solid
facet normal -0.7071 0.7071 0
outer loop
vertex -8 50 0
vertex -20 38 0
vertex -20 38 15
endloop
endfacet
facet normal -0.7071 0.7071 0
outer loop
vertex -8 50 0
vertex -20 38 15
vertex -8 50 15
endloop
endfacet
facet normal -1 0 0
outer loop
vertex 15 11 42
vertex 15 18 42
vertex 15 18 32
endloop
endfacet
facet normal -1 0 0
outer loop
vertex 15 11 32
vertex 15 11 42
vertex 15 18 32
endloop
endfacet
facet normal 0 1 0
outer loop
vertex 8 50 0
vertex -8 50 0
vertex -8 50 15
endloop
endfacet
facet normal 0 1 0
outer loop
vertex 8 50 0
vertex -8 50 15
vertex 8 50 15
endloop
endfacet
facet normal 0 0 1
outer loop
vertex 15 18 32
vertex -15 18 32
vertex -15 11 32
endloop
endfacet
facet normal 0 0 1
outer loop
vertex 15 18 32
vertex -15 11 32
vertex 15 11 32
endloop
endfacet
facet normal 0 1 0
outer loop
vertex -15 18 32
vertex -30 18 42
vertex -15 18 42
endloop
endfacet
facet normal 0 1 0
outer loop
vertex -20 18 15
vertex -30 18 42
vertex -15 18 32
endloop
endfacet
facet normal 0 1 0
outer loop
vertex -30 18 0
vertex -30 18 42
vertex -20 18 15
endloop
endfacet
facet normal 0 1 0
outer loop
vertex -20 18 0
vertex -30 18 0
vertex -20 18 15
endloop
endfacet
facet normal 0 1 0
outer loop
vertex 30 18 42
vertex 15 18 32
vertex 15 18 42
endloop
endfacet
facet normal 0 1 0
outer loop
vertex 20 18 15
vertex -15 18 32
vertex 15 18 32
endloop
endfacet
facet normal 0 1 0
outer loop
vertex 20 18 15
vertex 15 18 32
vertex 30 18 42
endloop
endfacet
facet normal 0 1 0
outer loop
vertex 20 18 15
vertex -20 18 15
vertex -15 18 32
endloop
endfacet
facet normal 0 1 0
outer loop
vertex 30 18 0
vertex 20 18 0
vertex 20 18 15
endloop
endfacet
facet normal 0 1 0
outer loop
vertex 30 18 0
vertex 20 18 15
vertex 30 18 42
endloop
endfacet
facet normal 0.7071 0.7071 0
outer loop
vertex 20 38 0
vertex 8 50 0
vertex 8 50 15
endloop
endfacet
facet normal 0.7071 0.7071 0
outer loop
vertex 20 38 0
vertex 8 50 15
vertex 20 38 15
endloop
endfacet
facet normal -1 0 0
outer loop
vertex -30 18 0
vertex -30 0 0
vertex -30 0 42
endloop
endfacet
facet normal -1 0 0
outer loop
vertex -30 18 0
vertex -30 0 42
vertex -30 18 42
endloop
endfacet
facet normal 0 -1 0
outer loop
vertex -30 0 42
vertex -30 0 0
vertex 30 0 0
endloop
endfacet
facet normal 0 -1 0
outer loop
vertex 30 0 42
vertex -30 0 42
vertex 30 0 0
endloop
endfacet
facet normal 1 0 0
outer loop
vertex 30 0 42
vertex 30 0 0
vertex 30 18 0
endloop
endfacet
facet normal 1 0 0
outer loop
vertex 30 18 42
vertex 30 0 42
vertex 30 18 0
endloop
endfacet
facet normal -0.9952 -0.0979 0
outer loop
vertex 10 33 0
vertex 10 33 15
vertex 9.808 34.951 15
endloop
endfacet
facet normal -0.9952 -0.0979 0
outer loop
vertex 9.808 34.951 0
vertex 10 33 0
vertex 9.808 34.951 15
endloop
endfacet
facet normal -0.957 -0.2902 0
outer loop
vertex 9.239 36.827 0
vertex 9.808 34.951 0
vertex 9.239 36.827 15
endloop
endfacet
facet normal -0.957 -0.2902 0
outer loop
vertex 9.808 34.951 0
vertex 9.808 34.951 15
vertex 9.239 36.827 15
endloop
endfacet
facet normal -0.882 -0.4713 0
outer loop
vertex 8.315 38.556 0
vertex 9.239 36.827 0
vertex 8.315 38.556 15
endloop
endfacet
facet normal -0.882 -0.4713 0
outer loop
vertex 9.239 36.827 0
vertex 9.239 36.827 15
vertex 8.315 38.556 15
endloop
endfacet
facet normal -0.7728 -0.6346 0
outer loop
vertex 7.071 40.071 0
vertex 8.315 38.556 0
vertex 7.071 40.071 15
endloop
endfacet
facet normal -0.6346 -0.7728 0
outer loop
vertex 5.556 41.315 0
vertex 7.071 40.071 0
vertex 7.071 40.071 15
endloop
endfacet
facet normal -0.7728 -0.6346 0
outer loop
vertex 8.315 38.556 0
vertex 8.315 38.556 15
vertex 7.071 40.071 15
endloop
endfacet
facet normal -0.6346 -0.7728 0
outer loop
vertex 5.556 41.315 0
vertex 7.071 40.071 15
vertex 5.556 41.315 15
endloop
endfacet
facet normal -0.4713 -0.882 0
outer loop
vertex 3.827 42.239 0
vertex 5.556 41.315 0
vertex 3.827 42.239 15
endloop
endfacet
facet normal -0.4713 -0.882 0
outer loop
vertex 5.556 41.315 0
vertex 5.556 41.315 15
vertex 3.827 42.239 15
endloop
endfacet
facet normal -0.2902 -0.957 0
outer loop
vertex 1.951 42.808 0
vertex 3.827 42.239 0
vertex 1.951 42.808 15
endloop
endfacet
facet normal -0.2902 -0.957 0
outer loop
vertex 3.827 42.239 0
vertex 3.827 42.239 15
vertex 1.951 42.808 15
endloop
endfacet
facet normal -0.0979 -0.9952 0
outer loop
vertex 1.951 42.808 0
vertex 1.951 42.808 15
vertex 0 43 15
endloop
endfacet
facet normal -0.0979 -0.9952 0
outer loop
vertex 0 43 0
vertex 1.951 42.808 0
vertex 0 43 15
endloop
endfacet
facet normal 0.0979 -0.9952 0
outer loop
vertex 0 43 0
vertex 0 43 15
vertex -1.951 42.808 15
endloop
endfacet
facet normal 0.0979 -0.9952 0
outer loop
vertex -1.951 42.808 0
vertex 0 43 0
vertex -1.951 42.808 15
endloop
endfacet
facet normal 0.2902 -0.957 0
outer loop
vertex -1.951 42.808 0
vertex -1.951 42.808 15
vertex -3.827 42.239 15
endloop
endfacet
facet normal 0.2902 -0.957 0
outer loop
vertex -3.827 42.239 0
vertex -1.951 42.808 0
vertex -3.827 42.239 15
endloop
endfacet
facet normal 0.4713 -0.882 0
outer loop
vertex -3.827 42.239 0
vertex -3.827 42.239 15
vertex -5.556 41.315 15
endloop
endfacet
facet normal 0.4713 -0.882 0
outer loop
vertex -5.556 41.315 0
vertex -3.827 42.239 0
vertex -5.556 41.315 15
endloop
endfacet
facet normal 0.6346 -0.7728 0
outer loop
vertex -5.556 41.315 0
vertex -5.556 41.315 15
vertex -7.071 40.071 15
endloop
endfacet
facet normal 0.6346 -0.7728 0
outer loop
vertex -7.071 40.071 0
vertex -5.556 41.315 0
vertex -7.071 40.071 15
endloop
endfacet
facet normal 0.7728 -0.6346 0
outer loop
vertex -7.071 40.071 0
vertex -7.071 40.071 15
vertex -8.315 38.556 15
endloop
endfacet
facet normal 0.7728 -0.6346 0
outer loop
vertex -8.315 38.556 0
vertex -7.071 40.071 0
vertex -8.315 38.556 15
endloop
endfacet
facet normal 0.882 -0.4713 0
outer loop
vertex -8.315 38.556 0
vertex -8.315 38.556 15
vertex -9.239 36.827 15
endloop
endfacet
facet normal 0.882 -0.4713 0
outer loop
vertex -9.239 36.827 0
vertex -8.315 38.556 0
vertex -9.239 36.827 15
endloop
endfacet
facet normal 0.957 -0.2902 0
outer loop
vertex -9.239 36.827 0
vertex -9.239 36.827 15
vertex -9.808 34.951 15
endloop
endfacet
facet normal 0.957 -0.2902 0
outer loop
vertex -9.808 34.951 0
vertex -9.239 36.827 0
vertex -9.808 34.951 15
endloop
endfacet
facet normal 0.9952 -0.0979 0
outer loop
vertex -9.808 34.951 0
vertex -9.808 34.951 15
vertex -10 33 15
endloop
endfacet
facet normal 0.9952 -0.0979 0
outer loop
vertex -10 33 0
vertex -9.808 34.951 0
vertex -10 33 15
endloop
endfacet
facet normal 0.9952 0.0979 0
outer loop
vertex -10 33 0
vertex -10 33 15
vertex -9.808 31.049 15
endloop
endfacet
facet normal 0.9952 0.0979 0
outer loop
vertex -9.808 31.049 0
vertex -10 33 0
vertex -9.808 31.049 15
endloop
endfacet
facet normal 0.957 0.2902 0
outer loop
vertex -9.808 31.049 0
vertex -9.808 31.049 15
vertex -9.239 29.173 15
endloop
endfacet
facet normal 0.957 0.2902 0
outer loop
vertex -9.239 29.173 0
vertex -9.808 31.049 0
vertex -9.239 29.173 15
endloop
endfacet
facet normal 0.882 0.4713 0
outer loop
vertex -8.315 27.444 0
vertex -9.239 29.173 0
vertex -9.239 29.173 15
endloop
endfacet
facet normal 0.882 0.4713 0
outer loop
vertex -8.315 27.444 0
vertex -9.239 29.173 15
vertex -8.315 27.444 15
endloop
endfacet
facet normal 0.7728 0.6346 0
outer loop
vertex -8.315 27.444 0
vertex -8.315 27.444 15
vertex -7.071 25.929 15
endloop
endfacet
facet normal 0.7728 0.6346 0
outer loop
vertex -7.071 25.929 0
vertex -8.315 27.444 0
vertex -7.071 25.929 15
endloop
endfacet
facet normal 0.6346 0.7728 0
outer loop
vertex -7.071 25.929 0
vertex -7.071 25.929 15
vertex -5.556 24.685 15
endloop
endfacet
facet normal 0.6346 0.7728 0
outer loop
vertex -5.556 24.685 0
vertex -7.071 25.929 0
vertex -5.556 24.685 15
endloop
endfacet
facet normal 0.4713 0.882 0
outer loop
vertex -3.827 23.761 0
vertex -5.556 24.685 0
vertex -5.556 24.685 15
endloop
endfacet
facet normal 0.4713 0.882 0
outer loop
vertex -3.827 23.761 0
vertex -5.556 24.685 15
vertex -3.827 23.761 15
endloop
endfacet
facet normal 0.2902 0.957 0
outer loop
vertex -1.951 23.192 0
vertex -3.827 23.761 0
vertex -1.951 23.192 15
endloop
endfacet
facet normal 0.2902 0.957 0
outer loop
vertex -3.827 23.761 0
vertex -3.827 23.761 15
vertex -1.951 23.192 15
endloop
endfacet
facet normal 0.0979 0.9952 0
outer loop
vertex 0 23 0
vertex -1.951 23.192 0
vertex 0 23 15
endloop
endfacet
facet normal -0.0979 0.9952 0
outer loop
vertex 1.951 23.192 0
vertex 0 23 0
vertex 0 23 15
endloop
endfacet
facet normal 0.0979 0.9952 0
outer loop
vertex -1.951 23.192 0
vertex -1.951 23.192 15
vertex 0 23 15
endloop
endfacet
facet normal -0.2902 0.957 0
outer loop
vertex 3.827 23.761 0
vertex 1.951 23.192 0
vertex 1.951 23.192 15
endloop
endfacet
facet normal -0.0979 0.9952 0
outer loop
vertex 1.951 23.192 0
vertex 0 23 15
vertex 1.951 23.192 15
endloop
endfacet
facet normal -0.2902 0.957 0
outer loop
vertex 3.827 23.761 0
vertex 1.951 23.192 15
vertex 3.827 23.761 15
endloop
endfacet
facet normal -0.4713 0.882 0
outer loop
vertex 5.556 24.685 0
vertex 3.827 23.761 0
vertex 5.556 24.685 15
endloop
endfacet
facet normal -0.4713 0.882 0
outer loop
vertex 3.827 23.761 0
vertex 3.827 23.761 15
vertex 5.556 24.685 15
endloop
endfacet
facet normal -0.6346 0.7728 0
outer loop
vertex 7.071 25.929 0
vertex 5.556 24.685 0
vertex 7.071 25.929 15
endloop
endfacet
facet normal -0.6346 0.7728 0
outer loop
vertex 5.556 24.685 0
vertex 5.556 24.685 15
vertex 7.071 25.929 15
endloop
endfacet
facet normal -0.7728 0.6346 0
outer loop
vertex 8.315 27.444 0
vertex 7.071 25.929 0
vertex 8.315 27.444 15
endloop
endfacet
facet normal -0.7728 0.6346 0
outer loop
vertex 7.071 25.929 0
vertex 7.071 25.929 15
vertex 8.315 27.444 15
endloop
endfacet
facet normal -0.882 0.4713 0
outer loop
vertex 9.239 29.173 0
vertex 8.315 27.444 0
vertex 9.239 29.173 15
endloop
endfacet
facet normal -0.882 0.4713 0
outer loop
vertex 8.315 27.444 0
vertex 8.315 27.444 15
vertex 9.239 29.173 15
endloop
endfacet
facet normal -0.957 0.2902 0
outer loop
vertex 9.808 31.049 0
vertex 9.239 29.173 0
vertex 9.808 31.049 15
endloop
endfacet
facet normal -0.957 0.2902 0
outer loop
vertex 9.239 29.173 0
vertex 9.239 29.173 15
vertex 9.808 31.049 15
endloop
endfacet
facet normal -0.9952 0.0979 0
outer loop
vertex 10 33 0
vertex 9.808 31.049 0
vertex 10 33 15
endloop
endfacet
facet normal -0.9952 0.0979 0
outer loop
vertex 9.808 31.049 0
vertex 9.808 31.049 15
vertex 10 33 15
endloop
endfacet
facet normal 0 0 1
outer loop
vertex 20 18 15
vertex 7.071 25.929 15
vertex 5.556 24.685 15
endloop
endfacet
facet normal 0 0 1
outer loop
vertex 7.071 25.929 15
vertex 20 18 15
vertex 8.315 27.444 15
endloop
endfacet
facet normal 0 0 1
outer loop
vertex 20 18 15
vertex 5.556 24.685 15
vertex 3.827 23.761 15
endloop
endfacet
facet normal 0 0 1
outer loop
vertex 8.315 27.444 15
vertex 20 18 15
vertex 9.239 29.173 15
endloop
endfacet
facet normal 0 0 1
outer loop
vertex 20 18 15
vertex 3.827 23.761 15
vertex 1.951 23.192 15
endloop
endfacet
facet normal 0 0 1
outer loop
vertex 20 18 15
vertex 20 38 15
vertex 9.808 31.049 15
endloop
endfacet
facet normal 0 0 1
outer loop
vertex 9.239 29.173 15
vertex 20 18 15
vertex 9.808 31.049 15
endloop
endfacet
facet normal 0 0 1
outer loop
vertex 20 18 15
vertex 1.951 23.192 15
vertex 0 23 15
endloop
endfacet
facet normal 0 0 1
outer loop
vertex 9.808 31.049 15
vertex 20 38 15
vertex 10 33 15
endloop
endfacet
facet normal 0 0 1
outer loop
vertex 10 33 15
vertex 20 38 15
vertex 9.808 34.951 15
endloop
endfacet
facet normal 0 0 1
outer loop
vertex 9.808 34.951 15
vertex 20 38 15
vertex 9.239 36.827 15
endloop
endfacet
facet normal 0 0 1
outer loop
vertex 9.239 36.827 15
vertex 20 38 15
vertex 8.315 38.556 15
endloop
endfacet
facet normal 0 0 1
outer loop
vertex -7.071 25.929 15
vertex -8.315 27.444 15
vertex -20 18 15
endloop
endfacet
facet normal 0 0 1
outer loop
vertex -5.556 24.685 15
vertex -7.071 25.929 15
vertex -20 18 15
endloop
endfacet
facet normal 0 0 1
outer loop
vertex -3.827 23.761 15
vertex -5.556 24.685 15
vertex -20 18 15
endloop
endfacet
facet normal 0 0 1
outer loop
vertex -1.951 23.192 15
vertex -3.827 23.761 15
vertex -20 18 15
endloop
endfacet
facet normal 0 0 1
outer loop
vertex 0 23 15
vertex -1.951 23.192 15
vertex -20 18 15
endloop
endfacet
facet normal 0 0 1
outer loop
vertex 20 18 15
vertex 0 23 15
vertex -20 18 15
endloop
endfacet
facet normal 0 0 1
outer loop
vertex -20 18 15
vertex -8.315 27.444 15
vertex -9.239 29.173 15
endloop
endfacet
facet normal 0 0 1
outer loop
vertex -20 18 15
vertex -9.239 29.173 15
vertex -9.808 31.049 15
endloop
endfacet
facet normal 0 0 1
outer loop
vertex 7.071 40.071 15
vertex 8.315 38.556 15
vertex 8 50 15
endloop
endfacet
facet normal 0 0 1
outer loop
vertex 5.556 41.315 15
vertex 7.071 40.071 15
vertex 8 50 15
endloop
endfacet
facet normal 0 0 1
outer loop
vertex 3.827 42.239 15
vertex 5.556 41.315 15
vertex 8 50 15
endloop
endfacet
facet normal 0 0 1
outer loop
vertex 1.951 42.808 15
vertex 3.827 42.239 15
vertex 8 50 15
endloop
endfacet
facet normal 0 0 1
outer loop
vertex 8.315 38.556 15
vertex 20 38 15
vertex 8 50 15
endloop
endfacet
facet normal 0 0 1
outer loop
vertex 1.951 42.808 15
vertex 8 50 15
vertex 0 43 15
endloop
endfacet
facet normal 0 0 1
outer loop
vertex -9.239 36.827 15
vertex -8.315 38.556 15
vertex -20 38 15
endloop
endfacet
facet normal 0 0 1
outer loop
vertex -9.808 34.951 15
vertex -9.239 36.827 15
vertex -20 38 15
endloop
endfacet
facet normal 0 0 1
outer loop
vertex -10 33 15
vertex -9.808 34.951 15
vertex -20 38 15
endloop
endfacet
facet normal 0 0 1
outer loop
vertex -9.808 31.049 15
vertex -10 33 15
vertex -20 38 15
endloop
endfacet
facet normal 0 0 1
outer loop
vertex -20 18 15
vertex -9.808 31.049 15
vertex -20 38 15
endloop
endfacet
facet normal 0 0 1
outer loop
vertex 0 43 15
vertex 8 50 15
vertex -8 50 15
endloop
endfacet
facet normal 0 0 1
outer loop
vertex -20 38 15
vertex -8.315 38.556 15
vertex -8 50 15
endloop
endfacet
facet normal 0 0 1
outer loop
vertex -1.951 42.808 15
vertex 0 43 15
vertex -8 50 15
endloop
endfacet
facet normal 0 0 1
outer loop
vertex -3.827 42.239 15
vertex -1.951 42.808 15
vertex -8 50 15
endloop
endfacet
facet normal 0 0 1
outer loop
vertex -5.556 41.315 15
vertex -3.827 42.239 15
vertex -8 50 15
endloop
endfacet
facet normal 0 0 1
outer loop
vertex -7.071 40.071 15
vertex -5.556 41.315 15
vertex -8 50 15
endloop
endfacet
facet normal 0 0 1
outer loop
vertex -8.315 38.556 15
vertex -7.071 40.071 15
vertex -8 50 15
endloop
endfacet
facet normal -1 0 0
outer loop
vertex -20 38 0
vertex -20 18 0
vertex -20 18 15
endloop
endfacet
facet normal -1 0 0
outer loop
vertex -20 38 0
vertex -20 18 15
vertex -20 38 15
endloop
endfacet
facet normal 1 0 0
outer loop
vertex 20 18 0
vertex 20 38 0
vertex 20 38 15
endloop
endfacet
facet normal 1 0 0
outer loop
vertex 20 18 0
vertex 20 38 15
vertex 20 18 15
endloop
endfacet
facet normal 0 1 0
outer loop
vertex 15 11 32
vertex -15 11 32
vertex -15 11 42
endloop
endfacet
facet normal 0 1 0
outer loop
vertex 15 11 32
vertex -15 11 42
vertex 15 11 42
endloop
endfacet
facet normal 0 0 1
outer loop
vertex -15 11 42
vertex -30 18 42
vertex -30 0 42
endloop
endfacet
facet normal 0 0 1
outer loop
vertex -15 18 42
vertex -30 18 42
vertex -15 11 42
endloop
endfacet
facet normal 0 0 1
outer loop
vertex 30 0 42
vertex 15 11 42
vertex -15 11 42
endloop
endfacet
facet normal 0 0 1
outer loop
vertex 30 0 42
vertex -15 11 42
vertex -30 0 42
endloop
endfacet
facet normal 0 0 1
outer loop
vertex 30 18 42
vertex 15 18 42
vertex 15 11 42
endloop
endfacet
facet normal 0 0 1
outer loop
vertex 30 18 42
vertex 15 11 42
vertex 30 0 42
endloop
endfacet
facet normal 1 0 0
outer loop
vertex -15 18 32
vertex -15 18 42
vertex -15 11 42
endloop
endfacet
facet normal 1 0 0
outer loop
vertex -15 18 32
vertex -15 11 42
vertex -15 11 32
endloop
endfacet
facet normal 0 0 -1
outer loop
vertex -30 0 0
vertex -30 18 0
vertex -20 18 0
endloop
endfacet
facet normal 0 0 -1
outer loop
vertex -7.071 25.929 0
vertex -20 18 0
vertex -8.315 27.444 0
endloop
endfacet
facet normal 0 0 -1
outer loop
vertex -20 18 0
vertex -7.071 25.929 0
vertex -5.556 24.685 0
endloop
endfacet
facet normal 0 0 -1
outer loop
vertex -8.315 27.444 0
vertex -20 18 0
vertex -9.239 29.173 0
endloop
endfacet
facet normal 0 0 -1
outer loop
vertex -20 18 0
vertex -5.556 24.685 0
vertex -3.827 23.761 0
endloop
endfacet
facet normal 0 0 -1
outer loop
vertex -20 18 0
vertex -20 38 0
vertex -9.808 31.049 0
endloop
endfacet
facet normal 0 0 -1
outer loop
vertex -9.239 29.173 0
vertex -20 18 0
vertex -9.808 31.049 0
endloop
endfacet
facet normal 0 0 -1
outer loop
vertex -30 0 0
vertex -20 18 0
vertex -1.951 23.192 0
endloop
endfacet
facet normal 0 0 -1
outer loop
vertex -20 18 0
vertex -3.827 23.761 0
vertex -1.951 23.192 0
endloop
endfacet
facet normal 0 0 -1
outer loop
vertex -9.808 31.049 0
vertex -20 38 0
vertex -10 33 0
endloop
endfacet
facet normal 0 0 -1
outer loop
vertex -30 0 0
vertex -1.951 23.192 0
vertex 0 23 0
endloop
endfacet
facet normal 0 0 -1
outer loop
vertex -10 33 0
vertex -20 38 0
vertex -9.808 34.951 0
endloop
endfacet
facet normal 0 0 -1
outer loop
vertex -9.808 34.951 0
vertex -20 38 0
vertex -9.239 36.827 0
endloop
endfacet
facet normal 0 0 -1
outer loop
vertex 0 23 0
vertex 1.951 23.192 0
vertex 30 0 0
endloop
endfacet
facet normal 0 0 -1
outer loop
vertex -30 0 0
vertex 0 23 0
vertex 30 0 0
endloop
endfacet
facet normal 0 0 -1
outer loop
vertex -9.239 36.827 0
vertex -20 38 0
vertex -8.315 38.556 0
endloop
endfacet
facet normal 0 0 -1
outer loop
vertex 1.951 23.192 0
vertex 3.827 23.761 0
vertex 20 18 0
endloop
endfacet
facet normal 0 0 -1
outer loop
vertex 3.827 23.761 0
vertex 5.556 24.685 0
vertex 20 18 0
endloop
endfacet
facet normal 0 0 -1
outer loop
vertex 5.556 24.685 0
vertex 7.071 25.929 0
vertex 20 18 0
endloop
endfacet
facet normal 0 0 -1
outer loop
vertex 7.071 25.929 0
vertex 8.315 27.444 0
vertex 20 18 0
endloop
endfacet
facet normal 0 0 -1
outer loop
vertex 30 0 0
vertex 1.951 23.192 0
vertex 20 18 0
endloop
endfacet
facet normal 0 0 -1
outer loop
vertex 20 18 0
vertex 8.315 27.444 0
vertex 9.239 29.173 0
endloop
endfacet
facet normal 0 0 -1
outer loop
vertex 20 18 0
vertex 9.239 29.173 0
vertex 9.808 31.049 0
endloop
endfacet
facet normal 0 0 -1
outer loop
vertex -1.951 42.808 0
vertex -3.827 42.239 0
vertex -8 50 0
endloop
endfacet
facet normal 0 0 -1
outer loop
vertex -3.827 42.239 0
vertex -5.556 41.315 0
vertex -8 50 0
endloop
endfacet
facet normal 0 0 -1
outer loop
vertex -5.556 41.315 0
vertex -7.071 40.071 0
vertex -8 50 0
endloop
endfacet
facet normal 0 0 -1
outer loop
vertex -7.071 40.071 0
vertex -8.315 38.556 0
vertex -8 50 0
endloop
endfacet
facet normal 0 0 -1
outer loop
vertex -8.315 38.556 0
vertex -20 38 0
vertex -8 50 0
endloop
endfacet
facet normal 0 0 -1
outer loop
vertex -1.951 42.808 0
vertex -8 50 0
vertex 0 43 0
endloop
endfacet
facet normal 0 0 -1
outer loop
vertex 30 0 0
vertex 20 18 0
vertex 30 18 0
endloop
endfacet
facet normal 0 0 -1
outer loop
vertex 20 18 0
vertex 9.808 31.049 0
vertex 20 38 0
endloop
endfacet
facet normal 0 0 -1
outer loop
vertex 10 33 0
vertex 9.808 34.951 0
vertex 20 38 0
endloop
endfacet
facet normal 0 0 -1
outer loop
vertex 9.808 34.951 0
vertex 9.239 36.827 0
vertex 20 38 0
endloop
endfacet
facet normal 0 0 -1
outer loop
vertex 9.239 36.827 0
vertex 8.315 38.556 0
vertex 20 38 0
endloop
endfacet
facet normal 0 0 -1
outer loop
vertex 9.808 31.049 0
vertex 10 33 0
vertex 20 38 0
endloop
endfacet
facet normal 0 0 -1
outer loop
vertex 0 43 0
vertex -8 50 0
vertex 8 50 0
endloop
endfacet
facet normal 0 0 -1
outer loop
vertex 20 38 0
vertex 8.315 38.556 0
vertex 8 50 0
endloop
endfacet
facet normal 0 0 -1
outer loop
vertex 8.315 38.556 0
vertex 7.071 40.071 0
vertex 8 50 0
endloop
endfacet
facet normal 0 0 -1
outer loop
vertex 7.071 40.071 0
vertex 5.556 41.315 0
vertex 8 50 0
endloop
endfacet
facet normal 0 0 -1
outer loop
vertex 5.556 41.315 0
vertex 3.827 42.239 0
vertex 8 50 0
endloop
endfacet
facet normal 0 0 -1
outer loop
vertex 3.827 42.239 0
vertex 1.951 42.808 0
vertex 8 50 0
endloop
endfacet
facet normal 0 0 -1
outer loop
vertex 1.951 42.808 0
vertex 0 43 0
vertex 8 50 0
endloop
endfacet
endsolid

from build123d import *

# Parameters (mm, degrees)
SKETCH1_W           = 60
SKETCH1_H           = 18
BOSS_EXTRUDE1_DEPTH = 42
SKETCH2_W           = 30
SKETCH2_H           = 10
CUT_EXTRUDE1_DEPTH  = 7
BOSS_EXTRUDE2_DEPTH = 15
SKETCH4_R           = 10
CUT_EXTRUDE2_DEPTH  = 65.257295306


with BuildPart() as part:
    # Sketch1 → Boss-Extrude1 (new body)
    with BuildSketch(Plane.XY):
        with Locations((0, 9)):
            Rectangle(SKETCH1_W, SKETCH1_H)
    extrude(amount=BOSS_EXTRUDE1_DEPTH)

    # Sketch2 → Cut-Extrude1 (cut)
    with BuildSketch(Plane(origin=(0, 18, 0), x_dir=(1, 0, 0), z_dir=(0, 1, 0))):
        with Locations((0, -37)):
            Rectangle(SKETCH2_W, SKETCH2_H)
    extrude(amount=-CUT_EXTRUDE1_DEPTH, mode=Mode.SUBTRACT)

    # Sketch3 → Boss-Extrude2 (add)
    with BuildSketch(Plane(origin=(0, 0, 0), x_dir=(-1, 0, 0), z_dir=(0, 0, -1))):
        Polygon((20, 18), (20, 38), (8, 50), (-8, 50), (-20, 38), (-20, 18), align=None)
    extrude(amount=-BOSS_EXTRUDE2_DEPTH)

    # Sketch4 → Cut-Extrude2 (cut, through all)
    with BuildSketch(Plane.XY.offset(15)):
        with Locations((0, 33)):
            Circle(SKETCH4_R)
    extrude(amount=-CUT_EXTRUDE2_DEPTH, mode=Mode.SUBTRACT)


solid = part.part
